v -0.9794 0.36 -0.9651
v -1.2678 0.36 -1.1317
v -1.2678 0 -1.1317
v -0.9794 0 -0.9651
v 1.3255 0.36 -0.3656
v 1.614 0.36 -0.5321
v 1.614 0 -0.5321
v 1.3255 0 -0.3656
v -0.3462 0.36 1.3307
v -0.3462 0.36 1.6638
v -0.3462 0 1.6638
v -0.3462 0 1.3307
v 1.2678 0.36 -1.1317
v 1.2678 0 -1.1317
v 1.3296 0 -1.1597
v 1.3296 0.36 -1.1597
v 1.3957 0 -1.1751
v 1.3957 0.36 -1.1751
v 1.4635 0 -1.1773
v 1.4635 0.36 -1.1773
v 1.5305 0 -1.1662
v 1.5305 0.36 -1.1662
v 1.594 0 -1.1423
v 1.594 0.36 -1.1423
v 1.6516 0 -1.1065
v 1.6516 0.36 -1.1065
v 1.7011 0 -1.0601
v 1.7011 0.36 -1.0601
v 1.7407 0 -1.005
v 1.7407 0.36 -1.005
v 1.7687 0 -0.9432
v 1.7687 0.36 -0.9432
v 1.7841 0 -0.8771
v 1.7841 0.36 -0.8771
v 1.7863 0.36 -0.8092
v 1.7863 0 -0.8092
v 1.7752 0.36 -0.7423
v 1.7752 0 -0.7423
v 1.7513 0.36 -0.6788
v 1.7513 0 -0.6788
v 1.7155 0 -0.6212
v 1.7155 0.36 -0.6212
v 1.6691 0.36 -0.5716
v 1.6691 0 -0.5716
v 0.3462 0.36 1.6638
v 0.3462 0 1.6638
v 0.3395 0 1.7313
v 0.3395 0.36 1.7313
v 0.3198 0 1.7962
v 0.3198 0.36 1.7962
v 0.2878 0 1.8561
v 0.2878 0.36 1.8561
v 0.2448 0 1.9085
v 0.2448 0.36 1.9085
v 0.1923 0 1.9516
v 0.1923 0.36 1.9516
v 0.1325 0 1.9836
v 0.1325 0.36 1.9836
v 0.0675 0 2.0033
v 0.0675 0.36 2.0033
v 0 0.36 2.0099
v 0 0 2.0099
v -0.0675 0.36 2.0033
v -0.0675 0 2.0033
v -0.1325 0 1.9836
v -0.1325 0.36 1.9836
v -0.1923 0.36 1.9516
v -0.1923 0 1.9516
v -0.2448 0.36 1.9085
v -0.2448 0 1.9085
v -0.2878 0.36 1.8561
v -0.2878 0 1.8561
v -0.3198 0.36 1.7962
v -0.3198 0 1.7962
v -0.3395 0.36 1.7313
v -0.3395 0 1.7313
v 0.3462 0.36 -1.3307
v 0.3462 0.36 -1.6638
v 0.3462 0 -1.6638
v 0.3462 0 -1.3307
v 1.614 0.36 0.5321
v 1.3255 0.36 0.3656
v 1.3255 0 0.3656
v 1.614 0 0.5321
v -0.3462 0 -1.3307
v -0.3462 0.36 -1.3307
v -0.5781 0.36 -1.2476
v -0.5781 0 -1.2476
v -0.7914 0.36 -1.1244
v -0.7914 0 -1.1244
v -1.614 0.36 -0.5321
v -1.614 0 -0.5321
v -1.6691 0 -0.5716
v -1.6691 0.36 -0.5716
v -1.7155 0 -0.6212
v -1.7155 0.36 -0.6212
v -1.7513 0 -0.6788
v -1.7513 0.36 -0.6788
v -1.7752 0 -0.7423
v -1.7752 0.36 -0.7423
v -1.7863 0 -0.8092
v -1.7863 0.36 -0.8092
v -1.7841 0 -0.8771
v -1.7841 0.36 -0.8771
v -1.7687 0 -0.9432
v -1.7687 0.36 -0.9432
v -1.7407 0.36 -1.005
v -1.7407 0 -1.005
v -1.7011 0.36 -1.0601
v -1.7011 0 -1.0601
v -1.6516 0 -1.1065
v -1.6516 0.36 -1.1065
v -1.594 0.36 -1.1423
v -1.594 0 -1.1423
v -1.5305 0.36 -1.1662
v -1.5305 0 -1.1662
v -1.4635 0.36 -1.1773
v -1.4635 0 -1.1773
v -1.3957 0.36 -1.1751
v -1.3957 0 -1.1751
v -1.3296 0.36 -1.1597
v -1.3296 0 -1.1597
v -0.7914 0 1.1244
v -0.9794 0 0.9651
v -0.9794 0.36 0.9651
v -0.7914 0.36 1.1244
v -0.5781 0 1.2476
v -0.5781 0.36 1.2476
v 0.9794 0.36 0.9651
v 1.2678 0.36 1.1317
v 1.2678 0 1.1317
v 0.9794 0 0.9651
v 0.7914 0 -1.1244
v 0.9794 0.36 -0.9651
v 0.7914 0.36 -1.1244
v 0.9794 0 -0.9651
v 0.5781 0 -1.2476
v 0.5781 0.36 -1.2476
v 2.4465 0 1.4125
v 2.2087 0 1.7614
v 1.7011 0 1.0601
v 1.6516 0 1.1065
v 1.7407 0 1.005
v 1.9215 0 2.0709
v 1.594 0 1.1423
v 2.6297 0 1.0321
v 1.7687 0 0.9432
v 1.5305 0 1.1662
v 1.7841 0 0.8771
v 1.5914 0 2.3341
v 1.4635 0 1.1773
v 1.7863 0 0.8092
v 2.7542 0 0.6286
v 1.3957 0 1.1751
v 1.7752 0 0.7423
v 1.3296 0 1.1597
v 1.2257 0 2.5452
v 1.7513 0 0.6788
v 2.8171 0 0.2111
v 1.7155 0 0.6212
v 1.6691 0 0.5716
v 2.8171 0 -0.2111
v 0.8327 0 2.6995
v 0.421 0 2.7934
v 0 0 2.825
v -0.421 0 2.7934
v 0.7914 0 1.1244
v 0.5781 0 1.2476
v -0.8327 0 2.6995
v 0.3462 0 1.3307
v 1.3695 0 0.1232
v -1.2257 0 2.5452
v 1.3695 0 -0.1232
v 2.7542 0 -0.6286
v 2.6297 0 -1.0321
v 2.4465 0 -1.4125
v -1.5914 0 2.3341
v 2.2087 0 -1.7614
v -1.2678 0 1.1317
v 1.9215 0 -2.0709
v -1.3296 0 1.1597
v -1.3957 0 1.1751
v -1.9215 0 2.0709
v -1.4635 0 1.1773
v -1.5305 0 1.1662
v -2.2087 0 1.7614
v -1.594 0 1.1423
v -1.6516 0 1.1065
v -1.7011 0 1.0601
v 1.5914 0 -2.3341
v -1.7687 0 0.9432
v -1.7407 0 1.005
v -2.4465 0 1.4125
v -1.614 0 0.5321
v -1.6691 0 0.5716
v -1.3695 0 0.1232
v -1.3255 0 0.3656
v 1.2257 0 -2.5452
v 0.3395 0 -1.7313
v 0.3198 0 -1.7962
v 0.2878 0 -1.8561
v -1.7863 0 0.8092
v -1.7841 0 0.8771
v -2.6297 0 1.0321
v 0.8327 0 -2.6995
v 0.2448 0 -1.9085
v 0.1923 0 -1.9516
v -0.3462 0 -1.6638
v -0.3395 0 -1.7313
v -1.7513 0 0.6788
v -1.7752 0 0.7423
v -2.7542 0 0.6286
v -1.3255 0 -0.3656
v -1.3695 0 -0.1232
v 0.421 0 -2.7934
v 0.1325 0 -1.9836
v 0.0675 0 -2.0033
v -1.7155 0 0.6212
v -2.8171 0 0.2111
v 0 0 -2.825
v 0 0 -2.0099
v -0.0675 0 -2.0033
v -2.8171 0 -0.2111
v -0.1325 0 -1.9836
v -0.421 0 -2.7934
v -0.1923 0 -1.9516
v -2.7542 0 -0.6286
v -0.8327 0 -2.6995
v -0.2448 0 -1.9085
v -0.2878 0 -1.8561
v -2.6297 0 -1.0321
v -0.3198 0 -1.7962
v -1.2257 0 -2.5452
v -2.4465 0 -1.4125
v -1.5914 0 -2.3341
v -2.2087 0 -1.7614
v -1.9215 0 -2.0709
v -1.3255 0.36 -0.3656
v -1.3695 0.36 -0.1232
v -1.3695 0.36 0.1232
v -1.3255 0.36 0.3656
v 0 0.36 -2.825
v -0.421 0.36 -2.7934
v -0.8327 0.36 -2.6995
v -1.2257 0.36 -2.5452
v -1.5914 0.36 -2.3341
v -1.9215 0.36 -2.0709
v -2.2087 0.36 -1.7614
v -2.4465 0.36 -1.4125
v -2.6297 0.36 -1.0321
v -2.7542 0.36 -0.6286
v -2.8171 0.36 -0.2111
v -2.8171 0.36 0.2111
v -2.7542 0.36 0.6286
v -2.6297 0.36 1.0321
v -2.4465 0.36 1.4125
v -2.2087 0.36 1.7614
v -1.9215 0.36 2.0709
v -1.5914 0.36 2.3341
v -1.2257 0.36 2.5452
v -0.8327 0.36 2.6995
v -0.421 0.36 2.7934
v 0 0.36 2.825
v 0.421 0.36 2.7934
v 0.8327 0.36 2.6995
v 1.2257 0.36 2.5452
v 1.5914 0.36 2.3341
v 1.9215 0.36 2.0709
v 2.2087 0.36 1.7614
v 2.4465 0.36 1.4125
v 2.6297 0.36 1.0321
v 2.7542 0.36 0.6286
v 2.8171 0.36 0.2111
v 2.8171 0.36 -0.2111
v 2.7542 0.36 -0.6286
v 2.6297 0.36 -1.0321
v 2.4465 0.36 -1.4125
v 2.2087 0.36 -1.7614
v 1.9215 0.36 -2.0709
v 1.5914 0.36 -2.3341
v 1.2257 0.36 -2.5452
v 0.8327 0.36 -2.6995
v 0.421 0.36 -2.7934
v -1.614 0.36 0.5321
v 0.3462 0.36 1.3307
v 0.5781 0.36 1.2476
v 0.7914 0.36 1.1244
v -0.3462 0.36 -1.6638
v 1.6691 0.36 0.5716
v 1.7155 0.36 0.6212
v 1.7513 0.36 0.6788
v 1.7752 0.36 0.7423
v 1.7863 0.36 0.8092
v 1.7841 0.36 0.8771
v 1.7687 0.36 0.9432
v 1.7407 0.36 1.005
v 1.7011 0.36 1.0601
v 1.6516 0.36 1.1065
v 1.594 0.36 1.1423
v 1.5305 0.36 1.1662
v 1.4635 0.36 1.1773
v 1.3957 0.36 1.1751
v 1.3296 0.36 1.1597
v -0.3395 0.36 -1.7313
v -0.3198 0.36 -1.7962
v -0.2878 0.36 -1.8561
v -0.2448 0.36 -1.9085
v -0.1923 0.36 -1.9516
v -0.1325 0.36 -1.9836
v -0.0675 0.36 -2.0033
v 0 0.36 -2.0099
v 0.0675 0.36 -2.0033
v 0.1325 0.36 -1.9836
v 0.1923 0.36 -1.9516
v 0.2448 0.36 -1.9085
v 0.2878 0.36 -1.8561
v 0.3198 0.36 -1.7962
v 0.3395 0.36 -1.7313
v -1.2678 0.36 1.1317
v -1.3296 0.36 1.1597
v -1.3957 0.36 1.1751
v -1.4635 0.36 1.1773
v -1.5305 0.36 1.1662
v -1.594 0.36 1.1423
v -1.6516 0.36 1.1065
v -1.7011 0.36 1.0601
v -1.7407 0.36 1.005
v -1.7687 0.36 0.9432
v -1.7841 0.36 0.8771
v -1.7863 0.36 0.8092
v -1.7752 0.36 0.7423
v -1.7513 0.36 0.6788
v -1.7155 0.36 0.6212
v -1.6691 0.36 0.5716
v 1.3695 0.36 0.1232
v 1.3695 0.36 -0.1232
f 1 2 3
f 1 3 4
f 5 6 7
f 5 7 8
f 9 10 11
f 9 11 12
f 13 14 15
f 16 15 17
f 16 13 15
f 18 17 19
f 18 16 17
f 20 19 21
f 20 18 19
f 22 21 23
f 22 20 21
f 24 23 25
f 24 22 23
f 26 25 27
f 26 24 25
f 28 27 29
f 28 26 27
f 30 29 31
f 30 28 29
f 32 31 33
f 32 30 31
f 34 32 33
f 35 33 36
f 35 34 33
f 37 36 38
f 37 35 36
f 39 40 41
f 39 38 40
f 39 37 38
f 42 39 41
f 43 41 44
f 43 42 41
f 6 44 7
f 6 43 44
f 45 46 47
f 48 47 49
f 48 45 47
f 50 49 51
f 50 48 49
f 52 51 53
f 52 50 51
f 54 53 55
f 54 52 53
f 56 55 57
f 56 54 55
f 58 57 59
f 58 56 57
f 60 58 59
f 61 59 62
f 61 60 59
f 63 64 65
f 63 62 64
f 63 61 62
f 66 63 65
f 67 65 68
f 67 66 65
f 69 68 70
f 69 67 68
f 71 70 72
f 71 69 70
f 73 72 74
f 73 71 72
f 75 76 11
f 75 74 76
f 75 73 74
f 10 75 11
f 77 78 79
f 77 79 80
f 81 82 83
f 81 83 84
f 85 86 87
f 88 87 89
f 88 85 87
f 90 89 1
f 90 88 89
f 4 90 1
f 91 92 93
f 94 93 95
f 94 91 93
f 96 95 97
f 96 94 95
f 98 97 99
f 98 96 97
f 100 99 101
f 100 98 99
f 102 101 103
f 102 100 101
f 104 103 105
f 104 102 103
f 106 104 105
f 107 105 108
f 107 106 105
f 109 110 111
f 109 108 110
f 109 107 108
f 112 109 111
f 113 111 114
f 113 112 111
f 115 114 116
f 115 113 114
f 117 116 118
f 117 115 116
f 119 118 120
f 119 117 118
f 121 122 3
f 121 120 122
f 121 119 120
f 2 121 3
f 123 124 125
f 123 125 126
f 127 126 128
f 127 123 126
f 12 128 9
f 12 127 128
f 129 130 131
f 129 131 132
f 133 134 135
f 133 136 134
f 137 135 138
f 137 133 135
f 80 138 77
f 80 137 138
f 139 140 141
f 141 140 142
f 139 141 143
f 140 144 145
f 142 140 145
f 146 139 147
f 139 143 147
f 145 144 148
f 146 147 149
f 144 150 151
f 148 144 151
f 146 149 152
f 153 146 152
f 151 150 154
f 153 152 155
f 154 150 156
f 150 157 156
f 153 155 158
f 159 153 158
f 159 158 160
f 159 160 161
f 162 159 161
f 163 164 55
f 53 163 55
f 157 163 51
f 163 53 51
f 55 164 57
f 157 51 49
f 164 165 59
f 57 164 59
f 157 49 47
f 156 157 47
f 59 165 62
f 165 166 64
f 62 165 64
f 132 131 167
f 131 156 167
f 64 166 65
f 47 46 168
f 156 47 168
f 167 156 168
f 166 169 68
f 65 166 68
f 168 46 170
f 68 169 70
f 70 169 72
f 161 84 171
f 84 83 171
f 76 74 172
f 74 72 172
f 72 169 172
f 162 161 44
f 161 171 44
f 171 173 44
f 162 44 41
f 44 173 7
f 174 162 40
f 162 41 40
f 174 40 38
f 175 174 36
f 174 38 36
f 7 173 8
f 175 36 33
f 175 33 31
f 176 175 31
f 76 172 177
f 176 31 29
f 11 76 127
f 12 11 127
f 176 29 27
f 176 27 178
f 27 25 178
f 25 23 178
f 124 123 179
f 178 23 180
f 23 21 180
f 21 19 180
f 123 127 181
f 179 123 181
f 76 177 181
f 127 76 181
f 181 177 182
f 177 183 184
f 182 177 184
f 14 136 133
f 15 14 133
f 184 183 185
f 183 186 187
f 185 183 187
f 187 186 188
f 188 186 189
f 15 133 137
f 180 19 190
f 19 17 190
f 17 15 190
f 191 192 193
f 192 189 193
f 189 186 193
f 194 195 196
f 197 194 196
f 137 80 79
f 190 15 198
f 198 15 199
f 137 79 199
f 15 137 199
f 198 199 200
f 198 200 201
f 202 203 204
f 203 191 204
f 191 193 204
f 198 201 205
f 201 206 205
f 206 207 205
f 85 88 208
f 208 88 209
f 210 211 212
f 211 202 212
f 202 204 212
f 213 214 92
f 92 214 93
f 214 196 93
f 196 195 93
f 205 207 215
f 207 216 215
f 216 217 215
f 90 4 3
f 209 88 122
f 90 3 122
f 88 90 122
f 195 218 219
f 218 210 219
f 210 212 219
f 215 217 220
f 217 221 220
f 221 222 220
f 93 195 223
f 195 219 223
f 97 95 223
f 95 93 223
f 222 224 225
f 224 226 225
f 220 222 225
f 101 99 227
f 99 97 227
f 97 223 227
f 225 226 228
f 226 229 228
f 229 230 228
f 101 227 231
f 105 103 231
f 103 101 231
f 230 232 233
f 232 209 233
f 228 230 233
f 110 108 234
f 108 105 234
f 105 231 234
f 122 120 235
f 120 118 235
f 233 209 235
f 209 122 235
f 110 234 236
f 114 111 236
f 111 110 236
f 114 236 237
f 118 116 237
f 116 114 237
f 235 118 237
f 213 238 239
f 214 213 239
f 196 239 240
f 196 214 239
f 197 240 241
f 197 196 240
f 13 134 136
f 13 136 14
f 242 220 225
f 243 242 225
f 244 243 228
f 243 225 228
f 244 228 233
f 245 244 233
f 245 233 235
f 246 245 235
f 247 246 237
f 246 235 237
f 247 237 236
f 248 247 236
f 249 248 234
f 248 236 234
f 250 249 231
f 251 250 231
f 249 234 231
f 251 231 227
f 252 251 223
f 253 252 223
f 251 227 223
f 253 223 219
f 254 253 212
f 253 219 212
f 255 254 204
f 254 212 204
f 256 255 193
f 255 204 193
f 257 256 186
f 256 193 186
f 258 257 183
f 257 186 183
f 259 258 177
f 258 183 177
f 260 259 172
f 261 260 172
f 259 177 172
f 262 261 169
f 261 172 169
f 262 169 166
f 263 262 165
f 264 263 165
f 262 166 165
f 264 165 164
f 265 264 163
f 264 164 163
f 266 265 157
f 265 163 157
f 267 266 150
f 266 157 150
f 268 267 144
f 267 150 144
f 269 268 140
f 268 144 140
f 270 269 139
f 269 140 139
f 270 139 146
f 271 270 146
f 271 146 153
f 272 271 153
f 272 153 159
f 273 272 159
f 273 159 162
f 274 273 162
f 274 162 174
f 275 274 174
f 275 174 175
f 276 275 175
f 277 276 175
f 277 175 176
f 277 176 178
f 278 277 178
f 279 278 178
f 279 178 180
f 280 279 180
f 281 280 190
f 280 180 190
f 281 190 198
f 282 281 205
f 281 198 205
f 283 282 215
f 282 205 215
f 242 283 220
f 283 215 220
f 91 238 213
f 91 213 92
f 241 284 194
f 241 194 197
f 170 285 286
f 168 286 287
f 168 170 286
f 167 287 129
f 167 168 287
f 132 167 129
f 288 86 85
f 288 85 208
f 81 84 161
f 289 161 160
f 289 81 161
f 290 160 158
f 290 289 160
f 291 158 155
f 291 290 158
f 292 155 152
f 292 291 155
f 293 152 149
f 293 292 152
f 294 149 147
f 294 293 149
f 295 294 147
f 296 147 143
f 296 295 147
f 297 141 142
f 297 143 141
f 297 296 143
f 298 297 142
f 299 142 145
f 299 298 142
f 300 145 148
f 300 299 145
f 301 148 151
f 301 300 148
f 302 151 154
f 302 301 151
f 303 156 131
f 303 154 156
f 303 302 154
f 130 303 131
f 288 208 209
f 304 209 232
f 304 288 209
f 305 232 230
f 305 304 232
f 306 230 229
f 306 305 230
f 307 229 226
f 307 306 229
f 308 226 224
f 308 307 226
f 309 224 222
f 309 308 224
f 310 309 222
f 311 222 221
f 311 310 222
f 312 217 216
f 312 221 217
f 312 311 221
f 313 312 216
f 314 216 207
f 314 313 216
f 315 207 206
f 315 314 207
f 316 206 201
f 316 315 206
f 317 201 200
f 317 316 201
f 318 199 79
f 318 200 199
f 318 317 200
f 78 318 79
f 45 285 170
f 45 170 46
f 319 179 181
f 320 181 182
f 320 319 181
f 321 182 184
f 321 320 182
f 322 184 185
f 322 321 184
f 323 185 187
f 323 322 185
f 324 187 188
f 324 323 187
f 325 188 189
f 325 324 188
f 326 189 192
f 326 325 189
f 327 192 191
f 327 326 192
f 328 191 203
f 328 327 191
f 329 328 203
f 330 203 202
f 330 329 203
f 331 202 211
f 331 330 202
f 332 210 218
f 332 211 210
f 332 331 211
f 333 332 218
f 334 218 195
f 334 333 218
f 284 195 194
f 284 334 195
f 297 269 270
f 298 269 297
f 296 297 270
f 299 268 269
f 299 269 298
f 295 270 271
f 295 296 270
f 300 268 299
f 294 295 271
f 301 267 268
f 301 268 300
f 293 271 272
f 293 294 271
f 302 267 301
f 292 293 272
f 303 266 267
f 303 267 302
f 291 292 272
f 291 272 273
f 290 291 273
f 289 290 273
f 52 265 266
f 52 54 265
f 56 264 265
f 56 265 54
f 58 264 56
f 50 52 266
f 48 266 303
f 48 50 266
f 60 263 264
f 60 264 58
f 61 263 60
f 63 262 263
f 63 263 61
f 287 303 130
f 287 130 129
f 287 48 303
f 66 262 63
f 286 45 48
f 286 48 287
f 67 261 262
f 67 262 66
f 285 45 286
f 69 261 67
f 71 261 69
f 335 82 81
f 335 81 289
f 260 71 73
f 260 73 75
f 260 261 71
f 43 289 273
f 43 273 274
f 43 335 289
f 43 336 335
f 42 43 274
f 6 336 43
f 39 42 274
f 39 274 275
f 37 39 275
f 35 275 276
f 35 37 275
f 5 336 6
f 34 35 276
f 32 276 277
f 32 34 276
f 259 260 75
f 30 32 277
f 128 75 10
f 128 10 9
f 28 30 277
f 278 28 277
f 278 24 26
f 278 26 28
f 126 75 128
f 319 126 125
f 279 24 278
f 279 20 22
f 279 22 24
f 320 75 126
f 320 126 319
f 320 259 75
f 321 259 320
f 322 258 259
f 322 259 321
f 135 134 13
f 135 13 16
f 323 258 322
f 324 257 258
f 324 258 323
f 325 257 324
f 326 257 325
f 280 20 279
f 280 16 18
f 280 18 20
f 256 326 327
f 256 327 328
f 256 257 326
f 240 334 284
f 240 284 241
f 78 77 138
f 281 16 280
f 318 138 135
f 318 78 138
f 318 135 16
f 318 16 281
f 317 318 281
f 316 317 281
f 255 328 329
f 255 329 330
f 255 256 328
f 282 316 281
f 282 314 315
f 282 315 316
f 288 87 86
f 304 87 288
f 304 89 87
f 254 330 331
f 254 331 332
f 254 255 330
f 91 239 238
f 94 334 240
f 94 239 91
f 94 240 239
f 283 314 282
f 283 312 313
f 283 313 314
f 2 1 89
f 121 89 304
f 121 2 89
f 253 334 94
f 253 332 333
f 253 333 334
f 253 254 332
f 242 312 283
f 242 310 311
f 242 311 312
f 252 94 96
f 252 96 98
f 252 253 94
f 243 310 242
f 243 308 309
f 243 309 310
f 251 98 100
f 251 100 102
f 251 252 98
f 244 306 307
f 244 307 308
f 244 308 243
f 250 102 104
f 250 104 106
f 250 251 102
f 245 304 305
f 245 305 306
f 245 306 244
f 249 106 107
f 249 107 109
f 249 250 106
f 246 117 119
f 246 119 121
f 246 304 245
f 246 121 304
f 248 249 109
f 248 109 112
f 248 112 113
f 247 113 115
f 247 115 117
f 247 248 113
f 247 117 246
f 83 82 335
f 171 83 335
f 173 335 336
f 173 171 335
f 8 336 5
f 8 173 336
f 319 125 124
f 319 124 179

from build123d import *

# Parameters (mm, degrees)
SKETCH1_R           = 2.825
SKETCH1_R_2         = 1.375
BOSS_EXTRUDE1_DEPTH = 0.36
CUT_EXTRUDE1_DEPTH  = 5.011340175
CIRPATTERN1_COUNT   = 3
CIRPATTERN1_ANGLE   = 120


with BuildPart() as part:
    # Sketch1 → Boss-Extrude1 (new body)
    with BuildSketch(Plane(origin=(0, 0, 0), x_dir=(1, 0, 0), z_dir=(0, 1, 0))):
        Circle(SKETCH1_R)
        Circle(SKETCH1_R_2, mode=Mode.SUBTRACT)
    extrude(amount=BOSS_EXTRUDE1_DEPTH)

    # Sketch2 → Cut-Extrude1 (cut, through all)
    with BuildSketch(Plane(origin=(0, 0.36, 0), x_dir=(1, 0, 0), z_dir=(0, 1, 0))):
        with BuildLine():
            Line((-0.346155251, -1.663778464), (-0.346155251, 1.663778464))
            ThreePointArc((-0.346155251, 1.663778464), (0, 2.009933715), (0.346155251, 1.663778464))
            Line((0.346155251, 1.663778464), (0.346155251, -1.663778464))
            ThreePointArc((0.346155251, -1.663778464), (0, -2.009933715), (-0.346155251, -1.663778464))
        make_face()
    cut_extrude1 = extrude(amount=-CUT_EXTRUDE1_DEPTH, mode=Mode.SUBTRACT)

    # CirPattern1: Cut-Extrude1 ×3 about axis
    cirpattern1_axis = Axis((0, 0.36, 0), (0, -1, 0))
    for i in range(1, CIRPATTERN1_COUNT):
        add(cut_extrude1.rotate(cirpattern1_axis, i * CIRPATTERN1_ANGLE / (CIRPATTERN1_COUNT - 1)), mode=Mode.SUBTRACT)


solid = part.part
